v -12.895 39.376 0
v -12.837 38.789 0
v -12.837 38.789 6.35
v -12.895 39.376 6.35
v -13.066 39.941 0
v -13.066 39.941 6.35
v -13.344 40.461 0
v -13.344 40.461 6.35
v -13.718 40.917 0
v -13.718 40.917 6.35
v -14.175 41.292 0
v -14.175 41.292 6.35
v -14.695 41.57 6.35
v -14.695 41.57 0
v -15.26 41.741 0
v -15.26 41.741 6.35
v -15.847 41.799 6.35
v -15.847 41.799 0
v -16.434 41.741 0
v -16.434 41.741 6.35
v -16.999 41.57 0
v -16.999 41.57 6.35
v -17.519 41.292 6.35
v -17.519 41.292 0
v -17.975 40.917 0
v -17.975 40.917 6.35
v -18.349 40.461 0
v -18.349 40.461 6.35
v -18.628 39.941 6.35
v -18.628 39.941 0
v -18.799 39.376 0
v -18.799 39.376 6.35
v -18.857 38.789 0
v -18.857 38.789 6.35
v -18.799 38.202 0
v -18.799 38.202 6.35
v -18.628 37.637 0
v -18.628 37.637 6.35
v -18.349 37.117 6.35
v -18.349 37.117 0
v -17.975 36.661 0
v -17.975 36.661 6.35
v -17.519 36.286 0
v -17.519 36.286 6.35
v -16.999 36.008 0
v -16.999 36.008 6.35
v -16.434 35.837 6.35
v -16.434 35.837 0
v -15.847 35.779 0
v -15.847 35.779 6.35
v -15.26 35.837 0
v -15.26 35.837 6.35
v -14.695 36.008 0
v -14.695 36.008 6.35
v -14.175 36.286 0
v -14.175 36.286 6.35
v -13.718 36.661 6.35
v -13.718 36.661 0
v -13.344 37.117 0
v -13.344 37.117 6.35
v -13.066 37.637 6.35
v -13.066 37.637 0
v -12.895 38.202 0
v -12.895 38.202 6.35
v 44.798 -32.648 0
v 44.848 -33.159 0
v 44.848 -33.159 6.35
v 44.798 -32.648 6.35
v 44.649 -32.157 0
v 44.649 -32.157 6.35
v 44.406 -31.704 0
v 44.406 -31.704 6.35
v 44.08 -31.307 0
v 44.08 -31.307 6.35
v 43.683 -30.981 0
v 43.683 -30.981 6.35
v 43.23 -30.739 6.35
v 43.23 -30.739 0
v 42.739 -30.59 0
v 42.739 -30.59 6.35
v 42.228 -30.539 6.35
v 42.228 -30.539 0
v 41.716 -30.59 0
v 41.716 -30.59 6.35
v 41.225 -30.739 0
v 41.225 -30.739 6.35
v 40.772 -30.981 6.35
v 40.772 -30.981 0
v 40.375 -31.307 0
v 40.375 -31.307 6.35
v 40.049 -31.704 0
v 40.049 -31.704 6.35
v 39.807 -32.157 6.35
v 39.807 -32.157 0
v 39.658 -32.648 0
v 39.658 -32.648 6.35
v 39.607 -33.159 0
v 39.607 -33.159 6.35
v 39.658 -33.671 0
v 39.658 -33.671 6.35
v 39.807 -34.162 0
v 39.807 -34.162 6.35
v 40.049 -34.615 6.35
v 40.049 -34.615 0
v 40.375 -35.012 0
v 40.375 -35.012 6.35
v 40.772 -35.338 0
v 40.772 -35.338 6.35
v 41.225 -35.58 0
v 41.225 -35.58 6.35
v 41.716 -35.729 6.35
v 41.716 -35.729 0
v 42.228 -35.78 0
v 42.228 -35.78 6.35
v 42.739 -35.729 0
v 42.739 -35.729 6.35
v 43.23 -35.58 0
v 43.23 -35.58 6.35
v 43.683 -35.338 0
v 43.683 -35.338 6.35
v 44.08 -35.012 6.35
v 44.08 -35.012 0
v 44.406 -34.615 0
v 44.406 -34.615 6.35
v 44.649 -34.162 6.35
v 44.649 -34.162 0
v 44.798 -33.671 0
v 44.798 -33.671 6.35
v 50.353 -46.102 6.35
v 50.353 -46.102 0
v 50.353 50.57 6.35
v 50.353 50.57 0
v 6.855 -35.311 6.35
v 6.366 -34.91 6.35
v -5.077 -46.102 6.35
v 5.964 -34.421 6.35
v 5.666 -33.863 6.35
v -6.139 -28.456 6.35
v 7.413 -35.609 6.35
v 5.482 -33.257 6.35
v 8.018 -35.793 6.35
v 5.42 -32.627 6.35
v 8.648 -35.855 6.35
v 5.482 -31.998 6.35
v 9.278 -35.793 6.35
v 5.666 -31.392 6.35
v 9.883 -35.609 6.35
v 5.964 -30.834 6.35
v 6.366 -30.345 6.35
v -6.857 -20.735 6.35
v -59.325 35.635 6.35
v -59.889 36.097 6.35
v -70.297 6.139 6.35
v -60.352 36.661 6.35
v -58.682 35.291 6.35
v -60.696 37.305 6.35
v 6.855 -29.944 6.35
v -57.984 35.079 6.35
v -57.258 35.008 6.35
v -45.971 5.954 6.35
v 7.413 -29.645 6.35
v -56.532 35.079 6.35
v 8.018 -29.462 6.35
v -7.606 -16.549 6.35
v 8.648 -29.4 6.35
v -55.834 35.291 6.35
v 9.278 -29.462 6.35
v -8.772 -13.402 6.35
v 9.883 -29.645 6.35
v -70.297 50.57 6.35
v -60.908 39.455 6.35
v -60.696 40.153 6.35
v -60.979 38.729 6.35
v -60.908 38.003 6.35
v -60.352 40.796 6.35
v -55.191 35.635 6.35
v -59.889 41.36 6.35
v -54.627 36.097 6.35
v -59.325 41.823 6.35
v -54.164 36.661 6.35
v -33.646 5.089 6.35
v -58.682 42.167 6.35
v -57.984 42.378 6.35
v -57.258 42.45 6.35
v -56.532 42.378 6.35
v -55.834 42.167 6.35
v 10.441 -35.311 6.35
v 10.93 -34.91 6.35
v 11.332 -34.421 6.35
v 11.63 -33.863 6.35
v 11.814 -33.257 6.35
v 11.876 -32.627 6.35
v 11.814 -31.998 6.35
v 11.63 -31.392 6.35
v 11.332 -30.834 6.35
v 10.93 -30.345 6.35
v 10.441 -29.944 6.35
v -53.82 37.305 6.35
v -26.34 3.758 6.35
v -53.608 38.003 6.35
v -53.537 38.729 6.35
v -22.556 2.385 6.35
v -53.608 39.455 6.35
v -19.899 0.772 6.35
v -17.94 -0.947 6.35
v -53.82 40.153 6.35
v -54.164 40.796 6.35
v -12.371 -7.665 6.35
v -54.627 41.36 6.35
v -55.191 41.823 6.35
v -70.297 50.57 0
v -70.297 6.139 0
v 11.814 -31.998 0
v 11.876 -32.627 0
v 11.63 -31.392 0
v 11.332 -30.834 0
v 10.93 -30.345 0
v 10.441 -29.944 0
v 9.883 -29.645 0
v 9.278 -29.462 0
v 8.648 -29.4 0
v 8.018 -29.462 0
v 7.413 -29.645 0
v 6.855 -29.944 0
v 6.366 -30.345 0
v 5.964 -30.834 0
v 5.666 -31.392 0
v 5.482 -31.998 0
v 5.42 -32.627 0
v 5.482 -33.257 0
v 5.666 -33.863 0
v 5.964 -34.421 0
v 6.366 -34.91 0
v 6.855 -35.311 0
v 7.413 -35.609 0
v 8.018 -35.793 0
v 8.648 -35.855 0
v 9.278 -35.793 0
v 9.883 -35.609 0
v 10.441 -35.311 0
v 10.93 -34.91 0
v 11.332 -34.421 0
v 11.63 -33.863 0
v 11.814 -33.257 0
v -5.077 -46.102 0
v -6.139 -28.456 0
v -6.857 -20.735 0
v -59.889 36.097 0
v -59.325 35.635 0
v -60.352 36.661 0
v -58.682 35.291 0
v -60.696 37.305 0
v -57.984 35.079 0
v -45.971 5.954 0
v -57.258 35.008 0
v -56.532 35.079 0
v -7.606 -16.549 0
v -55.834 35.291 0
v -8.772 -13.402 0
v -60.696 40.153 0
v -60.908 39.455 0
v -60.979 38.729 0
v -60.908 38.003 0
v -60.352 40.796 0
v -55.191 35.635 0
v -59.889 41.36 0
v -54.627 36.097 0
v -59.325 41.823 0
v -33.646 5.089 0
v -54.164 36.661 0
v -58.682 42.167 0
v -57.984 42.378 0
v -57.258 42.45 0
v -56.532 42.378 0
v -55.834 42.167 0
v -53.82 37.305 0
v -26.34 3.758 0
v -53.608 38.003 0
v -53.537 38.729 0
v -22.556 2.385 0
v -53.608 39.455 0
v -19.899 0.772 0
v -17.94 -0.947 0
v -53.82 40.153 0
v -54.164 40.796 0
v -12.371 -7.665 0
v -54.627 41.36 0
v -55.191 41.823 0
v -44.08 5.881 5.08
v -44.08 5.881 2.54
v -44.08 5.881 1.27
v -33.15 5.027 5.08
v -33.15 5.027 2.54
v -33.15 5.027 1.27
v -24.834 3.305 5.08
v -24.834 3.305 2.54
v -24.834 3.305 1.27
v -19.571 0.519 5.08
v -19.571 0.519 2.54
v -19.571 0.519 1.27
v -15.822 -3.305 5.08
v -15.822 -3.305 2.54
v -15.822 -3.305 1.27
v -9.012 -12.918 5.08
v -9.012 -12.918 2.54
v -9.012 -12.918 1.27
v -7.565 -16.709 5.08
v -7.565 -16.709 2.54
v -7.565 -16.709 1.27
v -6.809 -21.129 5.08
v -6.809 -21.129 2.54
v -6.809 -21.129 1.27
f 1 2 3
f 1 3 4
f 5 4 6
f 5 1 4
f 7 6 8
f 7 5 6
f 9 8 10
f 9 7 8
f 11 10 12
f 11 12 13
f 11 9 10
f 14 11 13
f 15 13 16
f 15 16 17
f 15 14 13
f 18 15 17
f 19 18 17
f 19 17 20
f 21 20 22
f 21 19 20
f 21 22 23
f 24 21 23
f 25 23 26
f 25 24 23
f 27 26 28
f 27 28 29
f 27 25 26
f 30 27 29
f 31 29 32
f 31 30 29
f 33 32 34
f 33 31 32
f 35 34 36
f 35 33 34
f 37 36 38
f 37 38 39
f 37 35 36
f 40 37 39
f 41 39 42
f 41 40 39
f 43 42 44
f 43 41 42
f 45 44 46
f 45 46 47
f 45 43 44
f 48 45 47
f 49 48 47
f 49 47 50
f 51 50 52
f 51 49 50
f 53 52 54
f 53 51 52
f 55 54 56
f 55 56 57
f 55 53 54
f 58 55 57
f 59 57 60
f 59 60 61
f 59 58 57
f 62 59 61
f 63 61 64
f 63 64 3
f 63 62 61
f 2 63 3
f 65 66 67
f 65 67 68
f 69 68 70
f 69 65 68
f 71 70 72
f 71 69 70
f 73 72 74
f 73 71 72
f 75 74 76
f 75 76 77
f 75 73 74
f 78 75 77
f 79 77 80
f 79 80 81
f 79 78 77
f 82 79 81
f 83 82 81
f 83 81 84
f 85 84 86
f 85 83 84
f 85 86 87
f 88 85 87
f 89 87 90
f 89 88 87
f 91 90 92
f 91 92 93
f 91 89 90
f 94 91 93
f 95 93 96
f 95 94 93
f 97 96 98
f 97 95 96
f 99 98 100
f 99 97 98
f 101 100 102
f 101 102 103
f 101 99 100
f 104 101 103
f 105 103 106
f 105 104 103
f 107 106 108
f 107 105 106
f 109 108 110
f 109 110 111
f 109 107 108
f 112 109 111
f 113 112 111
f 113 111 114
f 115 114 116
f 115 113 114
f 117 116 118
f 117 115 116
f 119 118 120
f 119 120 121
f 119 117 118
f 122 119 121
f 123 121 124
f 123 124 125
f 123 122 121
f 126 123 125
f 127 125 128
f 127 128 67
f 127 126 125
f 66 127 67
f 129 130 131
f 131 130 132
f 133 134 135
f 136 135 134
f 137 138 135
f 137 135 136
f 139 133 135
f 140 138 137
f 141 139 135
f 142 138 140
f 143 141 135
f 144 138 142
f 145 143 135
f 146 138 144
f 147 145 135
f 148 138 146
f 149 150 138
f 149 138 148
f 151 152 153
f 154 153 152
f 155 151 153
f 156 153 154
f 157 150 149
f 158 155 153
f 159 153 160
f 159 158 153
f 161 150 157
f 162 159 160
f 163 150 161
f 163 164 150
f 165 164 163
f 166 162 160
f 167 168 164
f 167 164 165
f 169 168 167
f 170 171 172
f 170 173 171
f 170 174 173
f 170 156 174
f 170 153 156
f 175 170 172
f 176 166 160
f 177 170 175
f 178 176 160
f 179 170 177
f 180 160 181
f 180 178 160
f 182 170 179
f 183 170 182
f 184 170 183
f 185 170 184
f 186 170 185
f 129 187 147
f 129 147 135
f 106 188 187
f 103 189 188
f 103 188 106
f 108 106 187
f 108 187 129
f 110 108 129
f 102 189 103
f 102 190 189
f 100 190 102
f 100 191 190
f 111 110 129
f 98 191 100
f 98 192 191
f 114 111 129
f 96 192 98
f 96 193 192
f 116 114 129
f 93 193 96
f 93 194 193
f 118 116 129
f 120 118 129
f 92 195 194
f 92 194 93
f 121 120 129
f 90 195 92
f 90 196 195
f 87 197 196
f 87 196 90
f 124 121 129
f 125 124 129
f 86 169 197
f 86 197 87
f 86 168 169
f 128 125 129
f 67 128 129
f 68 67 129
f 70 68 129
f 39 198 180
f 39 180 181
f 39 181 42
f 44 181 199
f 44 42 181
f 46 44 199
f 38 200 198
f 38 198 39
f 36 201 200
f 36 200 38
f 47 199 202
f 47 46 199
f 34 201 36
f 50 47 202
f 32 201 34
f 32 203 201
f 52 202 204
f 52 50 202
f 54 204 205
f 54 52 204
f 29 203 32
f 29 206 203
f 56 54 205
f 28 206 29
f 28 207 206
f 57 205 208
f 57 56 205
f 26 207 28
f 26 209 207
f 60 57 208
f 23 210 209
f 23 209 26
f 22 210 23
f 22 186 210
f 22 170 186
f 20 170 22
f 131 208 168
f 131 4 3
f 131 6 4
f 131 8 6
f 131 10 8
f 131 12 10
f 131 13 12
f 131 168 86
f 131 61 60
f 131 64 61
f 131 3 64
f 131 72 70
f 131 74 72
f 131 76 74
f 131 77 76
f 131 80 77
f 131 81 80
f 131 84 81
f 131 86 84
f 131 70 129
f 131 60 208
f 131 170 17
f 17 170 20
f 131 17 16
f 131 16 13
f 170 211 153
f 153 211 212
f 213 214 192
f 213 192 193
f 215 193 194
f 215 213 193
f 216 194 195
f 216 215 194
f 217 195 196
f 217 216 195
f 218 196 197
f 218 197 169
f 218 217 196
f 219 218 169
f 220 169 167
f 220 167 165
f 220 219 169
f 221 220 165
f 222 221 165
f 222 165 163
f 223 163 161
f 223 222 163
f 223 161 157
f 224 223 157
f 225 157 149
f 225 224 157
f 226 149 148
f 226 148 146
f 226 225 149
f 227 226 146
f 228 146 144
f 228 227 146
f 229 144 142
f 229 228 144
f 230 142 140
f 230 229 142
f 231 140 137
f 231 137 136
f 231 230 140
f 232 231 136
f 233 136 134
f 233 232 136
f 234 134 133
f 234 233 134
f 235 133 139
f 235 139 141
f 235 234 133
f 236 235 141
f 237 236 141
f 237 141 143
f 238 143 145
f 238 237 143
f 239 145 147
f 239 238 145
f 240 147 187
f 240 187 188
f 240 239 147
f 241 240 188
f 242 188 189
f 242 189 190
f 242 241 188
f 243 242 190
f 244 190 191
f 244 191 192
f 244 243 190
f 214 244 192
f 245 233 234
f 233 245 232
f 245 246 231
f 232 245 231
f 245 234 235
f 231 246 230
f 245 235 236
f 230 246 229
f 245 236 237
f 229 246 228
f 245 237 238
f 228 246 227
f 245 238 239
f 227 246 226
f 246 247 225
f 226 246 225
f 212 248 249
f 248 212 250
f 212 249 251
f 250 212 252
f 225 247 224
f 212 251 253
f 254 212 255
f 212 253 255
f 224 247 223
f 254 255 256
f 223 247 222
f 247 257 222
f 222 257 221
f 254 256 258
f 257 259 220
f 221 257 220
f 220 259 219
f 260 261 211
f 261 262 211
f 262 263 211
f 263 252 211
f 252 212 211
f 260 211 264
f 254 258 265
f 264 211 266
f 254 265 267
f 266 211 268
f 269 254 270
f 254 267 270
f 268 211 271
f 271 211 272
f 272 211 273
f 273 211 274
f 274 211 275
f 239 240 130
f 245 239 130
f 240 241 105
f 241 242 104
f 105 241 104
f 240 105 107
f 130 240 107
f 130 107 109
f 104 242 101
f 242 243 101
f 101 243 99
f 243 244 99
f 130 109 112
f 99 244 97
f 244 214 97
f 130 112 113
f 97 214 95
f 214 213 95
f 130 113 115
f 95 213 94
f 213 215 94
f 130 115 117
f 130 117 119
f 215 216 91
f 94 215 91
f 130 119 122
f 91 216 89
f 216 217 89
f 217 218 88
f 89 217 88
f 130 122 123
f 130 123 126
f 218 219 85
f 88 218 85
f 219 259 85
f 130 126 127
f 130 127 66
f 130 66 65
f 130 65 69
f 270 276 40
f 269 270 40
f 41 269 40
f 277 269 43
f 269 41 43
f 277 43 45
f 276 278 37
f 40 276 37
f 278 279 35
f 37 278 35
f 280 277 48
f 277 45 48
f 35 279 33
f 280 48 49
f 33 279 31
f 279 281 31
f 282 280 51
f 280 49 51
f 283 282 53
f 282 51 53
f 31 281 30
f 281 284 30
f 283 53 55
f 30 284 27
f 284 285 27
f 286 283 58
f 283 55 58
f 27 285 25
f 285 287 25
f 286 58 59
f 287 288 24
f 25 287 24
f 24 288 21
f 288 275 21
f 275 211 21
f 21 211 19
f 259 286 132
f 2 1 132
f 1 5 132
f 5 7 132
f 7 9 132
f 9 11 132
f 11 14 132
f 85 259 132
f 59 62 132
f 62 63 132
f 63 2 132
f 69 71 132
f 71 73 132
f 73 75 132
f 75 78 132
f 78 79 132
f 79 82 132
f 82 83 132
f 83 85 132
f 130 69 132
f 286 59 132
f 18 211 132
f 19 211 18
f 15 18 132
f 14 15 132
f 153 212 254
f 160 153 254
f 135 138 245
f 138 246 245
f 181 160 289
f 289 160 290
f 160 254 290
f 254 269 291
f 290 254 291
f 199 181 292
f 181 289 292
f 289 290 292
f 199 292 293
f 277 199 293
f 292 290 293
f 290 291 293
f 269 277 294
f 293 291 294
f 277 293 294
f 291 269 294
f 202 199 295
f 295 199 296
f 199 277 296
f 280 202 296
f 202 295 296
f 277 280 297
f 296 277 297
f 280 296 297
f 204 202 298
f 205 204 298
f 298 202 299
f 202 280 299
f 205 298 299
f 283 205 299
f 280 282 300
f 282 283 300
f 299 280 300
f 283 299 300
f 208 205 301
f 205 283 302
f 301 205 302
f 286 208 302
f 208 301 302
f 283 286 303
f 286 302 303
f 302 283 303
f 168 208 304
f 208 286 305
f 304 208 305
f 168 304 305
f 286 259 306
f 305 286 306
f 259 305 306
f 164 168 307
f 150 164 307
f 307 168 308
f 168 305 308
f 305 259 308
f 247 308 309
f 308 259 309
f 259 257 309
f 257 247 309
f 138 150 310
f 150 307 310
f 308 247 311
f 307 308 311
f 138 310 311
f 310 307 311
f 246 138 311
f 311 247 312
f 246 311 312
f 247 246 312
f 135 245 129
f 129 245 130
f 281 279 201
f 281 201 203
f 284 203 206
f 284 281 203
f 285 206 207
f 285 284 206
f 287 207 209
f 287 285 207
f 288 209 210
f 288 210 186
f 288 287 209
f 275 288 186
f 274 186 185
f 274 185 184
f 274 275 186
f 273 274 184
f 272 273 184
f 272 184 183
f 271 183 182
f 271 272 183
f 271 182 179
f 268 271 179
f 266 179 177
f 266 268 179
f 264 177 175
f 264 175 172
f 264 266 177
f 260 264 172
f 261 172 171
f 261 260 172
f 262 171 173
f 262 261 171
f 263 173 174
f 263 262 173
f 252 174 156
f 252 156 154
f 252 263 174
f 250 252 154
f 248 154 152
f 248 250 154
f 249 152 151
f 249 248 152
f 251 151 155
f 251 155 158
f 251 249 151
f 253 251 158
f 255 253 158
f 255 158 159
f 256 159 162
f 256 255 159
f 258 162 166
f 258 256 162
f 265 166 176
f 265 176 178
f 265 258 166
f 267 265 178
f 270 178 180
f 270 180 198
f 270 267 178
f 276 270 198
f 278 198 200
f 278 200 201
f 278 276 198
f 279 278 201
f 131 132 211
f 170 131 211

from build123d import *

# Parameters (mm, degrees)
F0_R     = 3.227705
F0_R_2   = 2.6202831703
F0_R_3   = 3.7211
F0_R_4   = 3.0099
F1_DEPTH = 6.35


with BuildPart() as f1:
    # F0 (on Top) → F1 (new body)
    with BuildSketch(Plane.XY):
        with BuildLine():
            Line((50.3533543698, 50.5695272586), (-70.2966456302, 50.5695272586))
            Line((-70.2966456302, 50.5695272586), (-70.2966456302, 6.1389088832))
            add(Edge.make_bspline(
                [(-70.2966456302, 6.1389088832), (-52.0441571305, 6.2243048177), (-24.7506450339, 6.3520000068), (-16.0268583665, -2.7376199674), (-8.2325781541, -12.9339469203), (-6.413955806, -21.4539728098), (-5.5948416135, -36.5589979729), (-5.0773202083, -46.1024461493)],
                knots=[0, 0, 0, 0, 0.3147391889, 0.4706392699, 0.6307003445, 0.7666741971, 1, 1, 1, 1], degree=3))
            Line((-5.0773202083, -46.1024461493), (50.3533543698, -46.1024461493))
            Line((50.3533543698, -46.1024461493), (50.3533543698, 50.5695272586))
        make_face()
        with Locations((8.6481217295, -32.6273292303)):
            Circle(F0_R, mode=Mode.SUBTRACT)
        with Locations((42.2276780009, -33.1594906747)):
            Circle(F0_R_2, mode=Mode.SUBTRACT)
        with Locations((-57.2580881417, 38.7286692858)):
            Circle(F0_R_3, mode=Mode.SUBTRACT)
        with Locations((-15.8467981964, 38.7890487909)):
            Circle(F0_R_4, mode=Mode.SUBTRACT)
    extrude(amount=F1_DEPTH)


solid = f1.part
